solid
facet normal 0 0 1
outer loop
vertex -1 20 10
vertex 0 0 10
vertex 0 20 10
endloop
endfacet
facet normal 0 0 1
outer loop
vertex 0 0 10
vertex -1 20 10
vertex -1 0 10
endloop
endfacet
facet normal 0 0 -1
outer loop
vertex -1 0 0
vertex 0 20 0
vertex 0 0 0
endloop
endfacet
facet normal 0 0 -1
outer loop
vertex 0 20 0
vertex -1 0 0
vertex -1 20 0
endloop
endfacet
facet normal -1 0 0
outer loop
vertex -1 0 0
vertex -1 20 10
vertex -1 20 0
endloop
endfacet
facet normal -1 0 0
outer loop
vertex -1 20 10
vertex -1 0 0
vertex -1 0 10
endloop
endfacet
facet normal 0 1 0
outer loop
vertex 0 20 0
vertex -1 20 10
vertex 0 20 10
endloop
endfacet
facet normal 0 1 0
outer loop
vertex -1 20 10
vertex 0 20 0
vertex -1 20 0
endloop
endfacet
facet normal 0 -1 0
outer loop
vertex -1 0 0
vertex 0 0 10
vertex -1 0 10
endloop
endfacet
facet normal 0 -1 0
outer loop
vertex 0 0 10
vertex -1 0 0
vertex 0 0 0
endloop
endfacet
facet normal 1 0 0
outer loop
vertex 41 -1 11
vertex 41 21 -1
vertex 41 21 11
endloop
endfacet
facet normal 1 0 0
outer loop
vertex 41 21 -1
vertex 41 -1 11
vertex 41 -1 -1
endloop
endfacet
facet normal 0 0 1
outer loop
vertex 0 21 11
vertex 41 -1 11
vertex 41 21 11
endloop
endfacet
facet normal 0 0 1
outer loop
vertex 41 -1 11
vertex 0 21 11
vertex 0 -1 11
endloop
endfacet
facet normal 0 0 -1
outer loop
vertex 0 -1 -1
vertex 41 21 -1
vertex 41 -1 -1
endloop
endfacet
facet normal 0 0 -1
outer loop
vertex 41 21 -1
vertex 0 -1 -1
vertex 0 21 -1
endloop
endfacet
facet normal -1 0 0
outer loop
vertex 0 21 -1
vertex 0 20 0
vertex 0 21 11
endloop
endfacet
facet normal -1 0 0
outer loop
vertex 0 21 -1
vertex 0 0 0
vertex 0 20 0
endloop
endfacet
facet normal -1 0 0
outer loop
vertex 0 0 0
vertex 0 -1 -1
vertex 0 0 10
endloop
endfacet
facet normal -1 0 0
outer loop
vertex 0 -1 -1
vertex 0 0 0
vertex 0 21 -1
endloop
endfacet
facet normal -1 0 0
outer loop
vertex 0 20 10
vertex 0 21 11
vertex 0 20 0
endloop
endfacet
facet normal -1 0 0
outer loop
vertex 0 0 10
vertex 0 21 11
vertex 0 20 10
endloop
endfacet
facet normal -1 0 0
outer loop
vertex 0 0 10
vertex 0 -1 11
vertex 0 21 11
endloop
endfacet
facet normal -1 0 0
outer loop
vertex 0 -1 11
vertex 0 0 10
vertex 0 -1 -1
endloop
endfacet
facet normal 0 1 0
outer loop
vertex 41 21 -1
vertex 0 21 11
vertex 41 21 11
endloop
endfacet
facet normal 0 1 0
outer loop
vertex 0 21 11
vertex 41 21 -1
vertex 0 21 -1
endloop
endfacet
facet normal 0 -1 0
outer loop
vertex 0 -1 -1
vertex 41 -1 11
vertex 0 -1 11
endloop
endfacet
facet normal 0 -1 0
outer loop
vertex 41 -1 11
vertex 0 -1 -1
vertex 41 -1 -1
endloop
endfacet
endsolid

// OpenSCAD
// Unit of length: Unit.MM
union()
{
   color(c = [1.0, 0.0, 0.0, 1.0])
   {
      translate(v = [-1.0, 0.0, 0.0])
      {
         cube(size = [41.0, 20.0, 10.0], center = false);
      }
   }
   translate(v = [0.0, -1.0, -1.0])
   {
      cube(size = [41.0, 22.0, 12.0], center = false);
   }
}
